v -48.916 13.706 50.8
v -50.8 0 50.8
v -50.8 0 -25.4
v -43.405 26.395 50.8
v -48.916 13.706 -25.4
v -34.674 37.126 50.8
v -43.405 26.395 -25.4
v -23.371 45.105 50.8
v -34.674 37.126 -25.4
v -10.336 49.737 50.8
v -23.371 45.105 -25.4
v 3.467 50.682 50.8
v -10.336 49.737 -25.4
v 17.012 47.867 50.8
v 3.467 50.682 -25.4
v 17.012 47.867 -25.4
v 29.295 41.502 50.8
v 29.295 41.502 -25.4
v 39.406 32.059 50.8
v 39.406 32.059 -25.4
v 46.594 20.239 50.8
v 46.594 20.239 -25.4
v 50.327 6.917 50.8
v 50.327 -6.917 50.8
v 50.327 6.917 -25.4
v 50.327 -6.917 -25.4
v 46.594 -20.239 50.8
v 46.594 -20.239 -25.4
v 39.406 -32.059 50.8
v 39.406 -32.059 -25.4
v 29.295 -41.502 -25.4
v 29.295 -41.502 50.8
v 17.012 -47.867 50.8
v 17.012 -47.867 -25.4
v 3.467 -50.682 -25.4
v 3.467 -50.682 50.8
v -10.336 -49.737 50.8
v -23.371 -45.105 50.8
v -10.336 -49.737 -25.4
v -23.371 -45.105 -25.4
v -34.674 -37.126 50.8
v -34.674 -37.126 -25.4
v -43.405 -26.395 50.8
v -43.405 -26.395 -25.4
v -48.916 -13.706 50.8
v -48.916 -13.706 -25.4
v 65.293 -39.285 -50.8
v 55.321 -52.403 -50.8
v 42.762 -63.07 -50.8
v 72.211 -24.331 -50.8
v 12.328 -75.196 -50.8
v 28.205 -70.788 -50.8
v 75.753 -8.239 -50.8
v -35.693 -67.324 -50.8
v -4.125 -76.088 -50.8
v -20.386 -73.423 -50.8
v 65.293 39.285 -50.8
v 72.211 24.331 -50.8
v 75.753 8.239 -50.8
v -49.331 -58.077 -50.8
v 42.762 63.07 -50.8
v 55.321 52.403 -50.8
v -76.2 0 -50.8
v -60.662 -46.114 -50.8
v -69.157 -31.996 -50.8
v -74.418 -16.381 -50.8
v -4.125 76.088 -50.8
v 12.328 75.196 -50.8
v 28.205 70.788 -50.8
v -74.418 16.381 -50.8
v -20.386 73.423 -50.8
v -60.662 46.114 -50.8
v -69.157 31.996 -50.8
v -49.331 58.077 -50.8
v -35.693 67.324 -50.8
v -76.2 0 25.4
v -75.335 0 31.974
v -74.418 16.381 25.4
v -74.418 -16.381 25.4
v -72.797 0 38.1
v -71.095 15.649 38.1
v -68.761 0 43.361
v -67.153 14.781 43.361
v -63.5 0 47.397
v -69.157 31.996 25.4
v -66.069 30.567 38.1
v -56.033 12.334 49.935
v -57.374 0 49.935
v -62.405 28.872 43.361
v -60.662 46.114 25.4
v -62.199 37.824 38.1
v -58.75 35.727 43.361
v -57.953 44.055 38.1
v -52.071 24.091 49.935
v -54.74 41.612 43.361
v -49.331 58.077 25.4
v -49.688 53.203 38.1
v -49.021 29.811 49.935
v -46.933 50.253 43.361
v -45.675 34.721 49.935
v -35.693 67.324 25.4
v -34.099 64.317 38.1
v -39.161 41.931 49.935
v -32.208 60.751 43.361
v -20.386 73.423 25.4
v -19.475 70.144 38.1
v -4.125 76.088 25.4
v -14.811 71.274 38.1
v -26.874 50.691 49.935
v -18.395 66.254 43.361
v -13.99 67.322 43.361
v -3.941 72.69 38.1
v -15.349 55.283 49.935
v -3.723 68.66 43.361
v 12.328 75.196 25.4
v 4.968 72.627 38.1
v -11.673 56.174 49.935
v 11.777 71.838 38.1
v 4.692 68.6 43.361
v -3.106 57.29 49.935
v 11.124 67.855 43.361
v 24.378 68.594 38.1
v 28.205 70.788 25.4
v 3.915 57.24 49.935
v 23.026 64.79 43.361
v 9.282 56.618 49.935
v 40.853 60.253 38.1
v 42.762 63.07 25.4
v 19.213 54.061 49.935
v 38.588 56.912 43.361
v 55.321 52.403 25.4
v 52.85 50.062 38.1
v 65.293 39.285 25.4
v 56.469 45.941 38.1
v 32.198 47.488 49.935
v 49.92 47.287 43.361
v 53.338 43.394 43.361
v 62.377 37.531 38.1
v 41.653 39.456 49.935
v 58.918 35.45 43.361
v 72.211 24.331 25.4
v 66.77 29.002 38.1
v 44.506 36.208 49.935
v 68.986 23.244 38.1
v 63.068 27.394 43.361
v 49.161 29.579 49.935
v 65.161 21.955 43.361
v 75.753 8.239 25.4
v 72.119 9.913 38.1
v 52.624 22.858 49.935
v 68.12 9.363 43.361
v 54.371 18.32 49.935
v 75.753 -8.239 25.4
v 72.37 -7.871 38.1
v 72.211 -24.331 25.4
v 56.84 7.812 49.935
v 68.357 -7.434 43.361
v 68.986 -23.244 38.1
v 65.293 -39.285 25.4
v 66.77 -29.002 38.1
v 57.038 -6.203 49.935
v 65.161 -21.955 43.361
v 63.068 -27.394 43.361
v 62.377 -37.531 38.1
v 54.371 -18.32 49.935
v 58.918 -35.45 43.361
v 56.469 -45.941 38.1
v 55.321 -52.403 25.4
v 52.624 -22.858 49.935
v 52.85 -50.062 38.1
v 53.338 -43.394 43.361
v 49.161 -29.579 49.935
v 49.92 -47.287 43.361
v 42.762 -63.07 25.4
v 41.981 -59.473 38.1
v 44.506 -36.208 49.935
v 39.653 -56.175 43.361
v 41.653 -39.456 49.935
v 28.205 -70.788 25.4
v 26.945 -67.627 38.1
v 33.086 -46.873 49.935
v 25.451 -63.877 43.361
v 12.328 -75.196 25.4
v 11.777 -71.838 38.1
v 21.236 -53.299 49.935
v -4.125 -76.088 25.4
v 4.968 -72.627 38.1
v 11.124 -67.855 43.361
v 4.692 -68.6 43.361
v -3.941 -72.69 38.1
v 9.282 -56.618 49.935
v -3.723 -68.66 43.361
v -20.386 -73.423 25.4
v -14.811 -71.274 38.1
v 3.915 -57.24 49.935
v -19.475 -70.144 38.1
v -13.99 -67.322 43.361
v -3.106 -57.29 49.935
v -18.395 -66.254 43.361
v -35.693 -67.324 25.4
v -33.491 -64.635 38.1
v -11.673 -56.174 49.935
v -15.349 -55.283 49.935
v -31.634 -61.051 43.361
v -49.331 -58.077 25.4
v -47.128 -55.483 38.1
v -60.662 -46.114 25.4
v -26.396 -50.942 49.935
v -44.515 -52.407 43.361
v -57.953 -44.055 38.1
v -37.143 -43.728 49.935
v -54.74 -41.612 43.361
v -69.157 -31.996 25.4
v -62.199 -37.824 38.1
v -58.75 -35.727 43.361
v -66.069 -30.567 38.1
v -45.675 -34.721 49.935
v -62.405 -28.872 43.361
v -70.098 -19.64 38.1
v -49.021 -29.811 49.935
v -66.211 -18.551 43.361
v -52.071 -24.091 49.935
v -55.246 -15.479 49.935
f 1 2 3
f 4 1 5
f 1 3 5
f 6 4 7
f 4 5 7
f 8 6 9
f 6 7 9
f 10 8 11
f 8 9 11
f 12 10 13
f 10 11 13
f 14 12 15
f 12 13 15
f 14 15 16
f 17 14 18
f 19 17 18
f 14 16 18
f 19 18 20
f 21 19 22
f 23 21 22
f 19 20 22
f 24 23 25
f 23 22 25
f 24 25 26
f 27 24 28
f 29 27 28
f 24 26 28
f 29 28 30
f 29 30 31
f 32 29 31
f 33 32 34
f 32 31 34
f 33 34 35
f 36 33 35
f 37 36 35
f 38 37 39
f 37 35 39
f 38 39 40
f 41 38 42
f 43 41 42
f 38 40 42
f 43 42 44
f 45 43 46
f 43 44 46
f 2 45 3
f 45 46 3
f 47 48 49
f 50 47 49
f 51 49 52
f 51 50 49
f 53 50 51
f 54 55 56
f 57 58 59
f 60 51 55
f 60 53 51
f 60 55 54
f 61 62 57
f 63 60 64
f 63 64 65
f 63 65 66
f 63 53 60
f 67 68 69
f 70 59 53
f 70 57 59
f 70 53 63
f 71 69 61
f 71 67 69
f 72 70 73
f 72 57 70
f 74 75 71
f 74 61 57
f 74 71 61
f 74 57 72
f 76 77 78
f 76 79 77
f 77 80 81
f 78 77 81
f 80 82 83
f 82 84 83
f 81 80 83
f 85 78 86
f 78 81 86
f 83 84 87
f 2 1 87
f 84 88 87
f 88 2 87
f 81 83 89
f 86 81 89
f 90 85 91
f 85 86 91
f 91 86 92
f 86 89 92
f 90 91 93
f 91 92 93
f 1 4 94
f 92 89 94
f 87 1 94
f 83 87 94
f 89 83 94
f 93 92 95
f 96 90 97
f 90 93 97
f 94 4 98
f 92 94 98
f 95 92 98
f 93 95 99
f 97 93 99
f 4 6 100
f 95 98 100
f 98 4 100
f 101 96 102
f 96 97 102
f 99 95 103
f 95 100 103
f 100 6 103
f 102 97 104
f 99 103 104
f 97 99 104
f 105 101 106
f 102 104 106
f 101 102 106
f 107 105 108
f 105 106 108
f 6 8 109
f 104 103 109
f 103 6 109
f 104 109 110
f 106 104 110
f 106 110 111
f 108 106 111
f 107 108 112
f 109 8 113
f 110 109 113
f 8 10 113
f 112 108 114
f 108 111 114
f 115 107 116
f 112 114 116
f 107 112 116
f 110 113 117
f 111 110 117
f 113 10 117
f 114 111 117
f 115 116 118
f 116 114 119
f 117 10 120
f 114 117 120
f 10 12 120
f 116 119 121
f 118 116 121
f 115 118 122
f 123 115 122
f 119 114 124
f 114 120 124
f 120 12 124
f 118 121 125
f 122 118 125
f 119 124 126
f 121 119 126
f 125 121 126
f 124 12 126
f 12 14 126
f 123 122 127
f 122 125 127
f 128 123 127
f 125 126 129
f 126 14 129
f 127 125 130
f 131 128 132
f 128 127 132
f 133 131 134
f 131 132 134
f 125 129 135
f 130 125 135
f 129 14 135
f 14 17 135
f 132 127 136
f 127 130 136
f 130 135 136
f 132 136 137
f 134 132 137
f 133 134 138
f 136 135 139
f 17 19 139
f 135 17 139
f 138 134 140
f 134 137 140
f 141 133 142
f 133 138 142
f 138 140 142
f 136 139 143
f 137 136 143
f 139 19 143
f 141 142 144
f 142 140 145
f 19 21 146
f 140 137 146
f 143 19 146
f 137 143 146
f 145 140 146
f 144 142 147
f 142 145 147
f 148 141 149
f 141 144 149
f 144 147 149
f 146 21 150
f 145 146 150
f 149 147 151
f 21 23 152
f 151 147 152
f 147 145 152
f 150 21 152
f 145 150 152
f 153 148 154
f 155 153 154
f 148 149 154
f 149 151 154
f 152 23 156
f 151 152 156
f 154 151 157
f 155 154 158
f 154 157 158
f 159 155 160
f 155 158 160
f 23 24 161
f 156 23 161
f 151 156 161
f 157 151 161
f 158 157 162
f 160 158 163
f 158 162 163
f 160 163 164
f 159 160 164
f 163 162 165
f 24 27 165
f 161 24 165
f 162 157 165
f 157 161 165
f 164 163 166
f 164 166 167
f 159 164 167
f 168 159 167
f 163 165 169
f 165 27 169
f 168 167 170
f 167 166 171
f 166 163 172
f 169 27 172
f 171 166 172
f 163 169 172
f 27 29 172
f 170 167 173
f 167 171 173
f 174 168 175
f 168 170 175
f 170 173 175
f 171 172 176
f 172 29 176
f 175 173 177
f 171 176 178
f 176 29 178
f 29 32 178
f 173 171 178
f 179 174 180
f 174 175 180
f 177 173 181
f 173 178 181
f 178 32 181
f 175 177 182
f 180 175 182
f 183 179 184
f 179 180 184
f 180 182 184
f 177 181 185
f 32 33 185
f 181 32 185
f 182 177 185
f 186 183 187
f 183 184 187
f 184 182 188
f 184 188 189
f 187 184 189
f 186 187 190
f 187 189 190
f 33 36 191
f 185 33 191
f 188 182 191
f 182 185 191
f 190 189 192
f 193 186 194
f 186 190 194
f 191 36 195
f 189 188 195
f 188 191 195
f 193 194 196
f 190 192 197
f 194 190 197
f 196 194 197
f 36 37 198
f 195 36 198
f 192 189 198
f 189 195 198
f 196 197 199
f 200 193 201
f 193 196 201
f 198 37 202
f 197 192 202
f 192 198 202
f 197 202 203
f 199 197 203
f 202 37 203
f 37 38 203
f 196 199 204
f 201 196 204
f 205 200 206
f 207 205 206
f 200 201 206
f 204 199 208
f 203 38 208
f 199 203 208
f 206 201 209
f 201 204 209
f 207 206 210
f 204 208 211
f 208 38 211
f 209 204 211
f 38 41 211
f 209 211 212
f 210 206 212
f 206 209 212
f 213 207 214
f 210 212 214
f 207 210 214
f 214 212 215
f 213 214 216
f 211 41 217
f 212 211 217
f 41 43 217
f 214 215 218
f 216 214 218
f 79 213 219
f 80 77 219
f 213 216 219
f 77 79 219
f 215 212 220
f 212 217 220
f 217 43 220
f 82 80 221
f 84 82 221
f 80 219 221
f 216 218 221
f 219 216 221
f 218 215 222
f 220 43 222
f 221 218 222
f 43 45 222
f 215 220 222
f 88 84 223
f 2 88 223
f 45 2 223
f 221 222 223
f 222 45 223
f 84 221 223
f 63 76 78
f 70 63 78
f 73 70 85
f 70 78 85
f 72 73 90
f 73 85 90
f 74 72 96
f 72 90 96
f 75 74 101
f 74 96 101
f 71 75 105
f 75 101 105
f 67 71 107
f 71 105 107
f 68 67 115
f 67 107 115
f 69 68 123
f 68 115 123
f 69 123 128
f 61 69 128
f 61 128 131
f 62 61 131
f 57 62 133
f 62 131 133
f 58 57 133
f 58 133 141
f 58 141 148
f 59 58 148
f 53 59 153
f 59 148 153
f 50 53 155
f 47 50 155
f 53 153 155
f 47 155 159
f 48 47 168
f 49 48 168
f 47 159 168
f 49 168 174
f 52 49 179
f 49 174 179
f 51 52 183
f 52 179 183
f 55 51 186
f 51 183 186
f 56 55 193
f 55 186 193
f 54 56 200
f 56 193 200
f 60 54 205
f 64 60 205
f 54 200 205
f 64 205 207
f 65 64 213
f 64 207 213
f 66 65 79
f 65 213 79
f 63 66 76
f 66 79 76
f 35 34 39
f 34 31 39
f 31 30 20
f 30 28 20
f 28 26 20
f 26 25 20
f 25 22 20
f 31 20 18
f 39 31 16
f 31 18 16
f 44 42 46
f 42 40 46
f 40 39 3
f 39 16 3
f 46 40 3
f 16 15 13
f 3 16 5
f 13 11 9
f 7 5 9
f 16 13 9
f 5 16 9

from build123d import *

# Parameters (mm, degrees)
F0_W = 76.2
F0_H = 101.6
F2_R = 25.4
F3_T = -25.4


# Not quite as in the source:
# - a shell that OpenCascade refuses in one call is made with other operations: the cavity is built on its own and cut out


with BuildPart() as f1:
    # F0 (on Front) → F1 (revolve)
    with BuildSketch(Plane.XZ):
        with Locations((-38.1, 0)):
            Rectangle(F0_W, F0_H)
    revolve(axis=Axis((0, 0, 0), (0, 0, -1)))

    # F2
    f2_edges = [f1.edges().sort_by_distance(p)[0] for p in [
        (76.2, 0, 50.8),
    ]]
    fillet(f2_edges, radius=F2_R)

    # F3: a shell. OpenCascade refuses it in one call, so the cavity is built on its own and cut out:
    # the body offset inwards by the wall thickness, plus a prism from it out through each open face.
    f3_core = offset(f1.part, amount=F3_T, kind=Kind.INTERSECTION, mode=Mode.PRIVATE)
    f3_exits = [f3_core.faces().sort_by_distance(p)[0] for p in [
        (0, 0, 25.4),
    ]]
    add(f3_core, mode=Mode.SUBTRACT)
    extrude(f3_exits, amount=-F3_T, mode=Mode.SUBTRACT)


solid = f1.part
